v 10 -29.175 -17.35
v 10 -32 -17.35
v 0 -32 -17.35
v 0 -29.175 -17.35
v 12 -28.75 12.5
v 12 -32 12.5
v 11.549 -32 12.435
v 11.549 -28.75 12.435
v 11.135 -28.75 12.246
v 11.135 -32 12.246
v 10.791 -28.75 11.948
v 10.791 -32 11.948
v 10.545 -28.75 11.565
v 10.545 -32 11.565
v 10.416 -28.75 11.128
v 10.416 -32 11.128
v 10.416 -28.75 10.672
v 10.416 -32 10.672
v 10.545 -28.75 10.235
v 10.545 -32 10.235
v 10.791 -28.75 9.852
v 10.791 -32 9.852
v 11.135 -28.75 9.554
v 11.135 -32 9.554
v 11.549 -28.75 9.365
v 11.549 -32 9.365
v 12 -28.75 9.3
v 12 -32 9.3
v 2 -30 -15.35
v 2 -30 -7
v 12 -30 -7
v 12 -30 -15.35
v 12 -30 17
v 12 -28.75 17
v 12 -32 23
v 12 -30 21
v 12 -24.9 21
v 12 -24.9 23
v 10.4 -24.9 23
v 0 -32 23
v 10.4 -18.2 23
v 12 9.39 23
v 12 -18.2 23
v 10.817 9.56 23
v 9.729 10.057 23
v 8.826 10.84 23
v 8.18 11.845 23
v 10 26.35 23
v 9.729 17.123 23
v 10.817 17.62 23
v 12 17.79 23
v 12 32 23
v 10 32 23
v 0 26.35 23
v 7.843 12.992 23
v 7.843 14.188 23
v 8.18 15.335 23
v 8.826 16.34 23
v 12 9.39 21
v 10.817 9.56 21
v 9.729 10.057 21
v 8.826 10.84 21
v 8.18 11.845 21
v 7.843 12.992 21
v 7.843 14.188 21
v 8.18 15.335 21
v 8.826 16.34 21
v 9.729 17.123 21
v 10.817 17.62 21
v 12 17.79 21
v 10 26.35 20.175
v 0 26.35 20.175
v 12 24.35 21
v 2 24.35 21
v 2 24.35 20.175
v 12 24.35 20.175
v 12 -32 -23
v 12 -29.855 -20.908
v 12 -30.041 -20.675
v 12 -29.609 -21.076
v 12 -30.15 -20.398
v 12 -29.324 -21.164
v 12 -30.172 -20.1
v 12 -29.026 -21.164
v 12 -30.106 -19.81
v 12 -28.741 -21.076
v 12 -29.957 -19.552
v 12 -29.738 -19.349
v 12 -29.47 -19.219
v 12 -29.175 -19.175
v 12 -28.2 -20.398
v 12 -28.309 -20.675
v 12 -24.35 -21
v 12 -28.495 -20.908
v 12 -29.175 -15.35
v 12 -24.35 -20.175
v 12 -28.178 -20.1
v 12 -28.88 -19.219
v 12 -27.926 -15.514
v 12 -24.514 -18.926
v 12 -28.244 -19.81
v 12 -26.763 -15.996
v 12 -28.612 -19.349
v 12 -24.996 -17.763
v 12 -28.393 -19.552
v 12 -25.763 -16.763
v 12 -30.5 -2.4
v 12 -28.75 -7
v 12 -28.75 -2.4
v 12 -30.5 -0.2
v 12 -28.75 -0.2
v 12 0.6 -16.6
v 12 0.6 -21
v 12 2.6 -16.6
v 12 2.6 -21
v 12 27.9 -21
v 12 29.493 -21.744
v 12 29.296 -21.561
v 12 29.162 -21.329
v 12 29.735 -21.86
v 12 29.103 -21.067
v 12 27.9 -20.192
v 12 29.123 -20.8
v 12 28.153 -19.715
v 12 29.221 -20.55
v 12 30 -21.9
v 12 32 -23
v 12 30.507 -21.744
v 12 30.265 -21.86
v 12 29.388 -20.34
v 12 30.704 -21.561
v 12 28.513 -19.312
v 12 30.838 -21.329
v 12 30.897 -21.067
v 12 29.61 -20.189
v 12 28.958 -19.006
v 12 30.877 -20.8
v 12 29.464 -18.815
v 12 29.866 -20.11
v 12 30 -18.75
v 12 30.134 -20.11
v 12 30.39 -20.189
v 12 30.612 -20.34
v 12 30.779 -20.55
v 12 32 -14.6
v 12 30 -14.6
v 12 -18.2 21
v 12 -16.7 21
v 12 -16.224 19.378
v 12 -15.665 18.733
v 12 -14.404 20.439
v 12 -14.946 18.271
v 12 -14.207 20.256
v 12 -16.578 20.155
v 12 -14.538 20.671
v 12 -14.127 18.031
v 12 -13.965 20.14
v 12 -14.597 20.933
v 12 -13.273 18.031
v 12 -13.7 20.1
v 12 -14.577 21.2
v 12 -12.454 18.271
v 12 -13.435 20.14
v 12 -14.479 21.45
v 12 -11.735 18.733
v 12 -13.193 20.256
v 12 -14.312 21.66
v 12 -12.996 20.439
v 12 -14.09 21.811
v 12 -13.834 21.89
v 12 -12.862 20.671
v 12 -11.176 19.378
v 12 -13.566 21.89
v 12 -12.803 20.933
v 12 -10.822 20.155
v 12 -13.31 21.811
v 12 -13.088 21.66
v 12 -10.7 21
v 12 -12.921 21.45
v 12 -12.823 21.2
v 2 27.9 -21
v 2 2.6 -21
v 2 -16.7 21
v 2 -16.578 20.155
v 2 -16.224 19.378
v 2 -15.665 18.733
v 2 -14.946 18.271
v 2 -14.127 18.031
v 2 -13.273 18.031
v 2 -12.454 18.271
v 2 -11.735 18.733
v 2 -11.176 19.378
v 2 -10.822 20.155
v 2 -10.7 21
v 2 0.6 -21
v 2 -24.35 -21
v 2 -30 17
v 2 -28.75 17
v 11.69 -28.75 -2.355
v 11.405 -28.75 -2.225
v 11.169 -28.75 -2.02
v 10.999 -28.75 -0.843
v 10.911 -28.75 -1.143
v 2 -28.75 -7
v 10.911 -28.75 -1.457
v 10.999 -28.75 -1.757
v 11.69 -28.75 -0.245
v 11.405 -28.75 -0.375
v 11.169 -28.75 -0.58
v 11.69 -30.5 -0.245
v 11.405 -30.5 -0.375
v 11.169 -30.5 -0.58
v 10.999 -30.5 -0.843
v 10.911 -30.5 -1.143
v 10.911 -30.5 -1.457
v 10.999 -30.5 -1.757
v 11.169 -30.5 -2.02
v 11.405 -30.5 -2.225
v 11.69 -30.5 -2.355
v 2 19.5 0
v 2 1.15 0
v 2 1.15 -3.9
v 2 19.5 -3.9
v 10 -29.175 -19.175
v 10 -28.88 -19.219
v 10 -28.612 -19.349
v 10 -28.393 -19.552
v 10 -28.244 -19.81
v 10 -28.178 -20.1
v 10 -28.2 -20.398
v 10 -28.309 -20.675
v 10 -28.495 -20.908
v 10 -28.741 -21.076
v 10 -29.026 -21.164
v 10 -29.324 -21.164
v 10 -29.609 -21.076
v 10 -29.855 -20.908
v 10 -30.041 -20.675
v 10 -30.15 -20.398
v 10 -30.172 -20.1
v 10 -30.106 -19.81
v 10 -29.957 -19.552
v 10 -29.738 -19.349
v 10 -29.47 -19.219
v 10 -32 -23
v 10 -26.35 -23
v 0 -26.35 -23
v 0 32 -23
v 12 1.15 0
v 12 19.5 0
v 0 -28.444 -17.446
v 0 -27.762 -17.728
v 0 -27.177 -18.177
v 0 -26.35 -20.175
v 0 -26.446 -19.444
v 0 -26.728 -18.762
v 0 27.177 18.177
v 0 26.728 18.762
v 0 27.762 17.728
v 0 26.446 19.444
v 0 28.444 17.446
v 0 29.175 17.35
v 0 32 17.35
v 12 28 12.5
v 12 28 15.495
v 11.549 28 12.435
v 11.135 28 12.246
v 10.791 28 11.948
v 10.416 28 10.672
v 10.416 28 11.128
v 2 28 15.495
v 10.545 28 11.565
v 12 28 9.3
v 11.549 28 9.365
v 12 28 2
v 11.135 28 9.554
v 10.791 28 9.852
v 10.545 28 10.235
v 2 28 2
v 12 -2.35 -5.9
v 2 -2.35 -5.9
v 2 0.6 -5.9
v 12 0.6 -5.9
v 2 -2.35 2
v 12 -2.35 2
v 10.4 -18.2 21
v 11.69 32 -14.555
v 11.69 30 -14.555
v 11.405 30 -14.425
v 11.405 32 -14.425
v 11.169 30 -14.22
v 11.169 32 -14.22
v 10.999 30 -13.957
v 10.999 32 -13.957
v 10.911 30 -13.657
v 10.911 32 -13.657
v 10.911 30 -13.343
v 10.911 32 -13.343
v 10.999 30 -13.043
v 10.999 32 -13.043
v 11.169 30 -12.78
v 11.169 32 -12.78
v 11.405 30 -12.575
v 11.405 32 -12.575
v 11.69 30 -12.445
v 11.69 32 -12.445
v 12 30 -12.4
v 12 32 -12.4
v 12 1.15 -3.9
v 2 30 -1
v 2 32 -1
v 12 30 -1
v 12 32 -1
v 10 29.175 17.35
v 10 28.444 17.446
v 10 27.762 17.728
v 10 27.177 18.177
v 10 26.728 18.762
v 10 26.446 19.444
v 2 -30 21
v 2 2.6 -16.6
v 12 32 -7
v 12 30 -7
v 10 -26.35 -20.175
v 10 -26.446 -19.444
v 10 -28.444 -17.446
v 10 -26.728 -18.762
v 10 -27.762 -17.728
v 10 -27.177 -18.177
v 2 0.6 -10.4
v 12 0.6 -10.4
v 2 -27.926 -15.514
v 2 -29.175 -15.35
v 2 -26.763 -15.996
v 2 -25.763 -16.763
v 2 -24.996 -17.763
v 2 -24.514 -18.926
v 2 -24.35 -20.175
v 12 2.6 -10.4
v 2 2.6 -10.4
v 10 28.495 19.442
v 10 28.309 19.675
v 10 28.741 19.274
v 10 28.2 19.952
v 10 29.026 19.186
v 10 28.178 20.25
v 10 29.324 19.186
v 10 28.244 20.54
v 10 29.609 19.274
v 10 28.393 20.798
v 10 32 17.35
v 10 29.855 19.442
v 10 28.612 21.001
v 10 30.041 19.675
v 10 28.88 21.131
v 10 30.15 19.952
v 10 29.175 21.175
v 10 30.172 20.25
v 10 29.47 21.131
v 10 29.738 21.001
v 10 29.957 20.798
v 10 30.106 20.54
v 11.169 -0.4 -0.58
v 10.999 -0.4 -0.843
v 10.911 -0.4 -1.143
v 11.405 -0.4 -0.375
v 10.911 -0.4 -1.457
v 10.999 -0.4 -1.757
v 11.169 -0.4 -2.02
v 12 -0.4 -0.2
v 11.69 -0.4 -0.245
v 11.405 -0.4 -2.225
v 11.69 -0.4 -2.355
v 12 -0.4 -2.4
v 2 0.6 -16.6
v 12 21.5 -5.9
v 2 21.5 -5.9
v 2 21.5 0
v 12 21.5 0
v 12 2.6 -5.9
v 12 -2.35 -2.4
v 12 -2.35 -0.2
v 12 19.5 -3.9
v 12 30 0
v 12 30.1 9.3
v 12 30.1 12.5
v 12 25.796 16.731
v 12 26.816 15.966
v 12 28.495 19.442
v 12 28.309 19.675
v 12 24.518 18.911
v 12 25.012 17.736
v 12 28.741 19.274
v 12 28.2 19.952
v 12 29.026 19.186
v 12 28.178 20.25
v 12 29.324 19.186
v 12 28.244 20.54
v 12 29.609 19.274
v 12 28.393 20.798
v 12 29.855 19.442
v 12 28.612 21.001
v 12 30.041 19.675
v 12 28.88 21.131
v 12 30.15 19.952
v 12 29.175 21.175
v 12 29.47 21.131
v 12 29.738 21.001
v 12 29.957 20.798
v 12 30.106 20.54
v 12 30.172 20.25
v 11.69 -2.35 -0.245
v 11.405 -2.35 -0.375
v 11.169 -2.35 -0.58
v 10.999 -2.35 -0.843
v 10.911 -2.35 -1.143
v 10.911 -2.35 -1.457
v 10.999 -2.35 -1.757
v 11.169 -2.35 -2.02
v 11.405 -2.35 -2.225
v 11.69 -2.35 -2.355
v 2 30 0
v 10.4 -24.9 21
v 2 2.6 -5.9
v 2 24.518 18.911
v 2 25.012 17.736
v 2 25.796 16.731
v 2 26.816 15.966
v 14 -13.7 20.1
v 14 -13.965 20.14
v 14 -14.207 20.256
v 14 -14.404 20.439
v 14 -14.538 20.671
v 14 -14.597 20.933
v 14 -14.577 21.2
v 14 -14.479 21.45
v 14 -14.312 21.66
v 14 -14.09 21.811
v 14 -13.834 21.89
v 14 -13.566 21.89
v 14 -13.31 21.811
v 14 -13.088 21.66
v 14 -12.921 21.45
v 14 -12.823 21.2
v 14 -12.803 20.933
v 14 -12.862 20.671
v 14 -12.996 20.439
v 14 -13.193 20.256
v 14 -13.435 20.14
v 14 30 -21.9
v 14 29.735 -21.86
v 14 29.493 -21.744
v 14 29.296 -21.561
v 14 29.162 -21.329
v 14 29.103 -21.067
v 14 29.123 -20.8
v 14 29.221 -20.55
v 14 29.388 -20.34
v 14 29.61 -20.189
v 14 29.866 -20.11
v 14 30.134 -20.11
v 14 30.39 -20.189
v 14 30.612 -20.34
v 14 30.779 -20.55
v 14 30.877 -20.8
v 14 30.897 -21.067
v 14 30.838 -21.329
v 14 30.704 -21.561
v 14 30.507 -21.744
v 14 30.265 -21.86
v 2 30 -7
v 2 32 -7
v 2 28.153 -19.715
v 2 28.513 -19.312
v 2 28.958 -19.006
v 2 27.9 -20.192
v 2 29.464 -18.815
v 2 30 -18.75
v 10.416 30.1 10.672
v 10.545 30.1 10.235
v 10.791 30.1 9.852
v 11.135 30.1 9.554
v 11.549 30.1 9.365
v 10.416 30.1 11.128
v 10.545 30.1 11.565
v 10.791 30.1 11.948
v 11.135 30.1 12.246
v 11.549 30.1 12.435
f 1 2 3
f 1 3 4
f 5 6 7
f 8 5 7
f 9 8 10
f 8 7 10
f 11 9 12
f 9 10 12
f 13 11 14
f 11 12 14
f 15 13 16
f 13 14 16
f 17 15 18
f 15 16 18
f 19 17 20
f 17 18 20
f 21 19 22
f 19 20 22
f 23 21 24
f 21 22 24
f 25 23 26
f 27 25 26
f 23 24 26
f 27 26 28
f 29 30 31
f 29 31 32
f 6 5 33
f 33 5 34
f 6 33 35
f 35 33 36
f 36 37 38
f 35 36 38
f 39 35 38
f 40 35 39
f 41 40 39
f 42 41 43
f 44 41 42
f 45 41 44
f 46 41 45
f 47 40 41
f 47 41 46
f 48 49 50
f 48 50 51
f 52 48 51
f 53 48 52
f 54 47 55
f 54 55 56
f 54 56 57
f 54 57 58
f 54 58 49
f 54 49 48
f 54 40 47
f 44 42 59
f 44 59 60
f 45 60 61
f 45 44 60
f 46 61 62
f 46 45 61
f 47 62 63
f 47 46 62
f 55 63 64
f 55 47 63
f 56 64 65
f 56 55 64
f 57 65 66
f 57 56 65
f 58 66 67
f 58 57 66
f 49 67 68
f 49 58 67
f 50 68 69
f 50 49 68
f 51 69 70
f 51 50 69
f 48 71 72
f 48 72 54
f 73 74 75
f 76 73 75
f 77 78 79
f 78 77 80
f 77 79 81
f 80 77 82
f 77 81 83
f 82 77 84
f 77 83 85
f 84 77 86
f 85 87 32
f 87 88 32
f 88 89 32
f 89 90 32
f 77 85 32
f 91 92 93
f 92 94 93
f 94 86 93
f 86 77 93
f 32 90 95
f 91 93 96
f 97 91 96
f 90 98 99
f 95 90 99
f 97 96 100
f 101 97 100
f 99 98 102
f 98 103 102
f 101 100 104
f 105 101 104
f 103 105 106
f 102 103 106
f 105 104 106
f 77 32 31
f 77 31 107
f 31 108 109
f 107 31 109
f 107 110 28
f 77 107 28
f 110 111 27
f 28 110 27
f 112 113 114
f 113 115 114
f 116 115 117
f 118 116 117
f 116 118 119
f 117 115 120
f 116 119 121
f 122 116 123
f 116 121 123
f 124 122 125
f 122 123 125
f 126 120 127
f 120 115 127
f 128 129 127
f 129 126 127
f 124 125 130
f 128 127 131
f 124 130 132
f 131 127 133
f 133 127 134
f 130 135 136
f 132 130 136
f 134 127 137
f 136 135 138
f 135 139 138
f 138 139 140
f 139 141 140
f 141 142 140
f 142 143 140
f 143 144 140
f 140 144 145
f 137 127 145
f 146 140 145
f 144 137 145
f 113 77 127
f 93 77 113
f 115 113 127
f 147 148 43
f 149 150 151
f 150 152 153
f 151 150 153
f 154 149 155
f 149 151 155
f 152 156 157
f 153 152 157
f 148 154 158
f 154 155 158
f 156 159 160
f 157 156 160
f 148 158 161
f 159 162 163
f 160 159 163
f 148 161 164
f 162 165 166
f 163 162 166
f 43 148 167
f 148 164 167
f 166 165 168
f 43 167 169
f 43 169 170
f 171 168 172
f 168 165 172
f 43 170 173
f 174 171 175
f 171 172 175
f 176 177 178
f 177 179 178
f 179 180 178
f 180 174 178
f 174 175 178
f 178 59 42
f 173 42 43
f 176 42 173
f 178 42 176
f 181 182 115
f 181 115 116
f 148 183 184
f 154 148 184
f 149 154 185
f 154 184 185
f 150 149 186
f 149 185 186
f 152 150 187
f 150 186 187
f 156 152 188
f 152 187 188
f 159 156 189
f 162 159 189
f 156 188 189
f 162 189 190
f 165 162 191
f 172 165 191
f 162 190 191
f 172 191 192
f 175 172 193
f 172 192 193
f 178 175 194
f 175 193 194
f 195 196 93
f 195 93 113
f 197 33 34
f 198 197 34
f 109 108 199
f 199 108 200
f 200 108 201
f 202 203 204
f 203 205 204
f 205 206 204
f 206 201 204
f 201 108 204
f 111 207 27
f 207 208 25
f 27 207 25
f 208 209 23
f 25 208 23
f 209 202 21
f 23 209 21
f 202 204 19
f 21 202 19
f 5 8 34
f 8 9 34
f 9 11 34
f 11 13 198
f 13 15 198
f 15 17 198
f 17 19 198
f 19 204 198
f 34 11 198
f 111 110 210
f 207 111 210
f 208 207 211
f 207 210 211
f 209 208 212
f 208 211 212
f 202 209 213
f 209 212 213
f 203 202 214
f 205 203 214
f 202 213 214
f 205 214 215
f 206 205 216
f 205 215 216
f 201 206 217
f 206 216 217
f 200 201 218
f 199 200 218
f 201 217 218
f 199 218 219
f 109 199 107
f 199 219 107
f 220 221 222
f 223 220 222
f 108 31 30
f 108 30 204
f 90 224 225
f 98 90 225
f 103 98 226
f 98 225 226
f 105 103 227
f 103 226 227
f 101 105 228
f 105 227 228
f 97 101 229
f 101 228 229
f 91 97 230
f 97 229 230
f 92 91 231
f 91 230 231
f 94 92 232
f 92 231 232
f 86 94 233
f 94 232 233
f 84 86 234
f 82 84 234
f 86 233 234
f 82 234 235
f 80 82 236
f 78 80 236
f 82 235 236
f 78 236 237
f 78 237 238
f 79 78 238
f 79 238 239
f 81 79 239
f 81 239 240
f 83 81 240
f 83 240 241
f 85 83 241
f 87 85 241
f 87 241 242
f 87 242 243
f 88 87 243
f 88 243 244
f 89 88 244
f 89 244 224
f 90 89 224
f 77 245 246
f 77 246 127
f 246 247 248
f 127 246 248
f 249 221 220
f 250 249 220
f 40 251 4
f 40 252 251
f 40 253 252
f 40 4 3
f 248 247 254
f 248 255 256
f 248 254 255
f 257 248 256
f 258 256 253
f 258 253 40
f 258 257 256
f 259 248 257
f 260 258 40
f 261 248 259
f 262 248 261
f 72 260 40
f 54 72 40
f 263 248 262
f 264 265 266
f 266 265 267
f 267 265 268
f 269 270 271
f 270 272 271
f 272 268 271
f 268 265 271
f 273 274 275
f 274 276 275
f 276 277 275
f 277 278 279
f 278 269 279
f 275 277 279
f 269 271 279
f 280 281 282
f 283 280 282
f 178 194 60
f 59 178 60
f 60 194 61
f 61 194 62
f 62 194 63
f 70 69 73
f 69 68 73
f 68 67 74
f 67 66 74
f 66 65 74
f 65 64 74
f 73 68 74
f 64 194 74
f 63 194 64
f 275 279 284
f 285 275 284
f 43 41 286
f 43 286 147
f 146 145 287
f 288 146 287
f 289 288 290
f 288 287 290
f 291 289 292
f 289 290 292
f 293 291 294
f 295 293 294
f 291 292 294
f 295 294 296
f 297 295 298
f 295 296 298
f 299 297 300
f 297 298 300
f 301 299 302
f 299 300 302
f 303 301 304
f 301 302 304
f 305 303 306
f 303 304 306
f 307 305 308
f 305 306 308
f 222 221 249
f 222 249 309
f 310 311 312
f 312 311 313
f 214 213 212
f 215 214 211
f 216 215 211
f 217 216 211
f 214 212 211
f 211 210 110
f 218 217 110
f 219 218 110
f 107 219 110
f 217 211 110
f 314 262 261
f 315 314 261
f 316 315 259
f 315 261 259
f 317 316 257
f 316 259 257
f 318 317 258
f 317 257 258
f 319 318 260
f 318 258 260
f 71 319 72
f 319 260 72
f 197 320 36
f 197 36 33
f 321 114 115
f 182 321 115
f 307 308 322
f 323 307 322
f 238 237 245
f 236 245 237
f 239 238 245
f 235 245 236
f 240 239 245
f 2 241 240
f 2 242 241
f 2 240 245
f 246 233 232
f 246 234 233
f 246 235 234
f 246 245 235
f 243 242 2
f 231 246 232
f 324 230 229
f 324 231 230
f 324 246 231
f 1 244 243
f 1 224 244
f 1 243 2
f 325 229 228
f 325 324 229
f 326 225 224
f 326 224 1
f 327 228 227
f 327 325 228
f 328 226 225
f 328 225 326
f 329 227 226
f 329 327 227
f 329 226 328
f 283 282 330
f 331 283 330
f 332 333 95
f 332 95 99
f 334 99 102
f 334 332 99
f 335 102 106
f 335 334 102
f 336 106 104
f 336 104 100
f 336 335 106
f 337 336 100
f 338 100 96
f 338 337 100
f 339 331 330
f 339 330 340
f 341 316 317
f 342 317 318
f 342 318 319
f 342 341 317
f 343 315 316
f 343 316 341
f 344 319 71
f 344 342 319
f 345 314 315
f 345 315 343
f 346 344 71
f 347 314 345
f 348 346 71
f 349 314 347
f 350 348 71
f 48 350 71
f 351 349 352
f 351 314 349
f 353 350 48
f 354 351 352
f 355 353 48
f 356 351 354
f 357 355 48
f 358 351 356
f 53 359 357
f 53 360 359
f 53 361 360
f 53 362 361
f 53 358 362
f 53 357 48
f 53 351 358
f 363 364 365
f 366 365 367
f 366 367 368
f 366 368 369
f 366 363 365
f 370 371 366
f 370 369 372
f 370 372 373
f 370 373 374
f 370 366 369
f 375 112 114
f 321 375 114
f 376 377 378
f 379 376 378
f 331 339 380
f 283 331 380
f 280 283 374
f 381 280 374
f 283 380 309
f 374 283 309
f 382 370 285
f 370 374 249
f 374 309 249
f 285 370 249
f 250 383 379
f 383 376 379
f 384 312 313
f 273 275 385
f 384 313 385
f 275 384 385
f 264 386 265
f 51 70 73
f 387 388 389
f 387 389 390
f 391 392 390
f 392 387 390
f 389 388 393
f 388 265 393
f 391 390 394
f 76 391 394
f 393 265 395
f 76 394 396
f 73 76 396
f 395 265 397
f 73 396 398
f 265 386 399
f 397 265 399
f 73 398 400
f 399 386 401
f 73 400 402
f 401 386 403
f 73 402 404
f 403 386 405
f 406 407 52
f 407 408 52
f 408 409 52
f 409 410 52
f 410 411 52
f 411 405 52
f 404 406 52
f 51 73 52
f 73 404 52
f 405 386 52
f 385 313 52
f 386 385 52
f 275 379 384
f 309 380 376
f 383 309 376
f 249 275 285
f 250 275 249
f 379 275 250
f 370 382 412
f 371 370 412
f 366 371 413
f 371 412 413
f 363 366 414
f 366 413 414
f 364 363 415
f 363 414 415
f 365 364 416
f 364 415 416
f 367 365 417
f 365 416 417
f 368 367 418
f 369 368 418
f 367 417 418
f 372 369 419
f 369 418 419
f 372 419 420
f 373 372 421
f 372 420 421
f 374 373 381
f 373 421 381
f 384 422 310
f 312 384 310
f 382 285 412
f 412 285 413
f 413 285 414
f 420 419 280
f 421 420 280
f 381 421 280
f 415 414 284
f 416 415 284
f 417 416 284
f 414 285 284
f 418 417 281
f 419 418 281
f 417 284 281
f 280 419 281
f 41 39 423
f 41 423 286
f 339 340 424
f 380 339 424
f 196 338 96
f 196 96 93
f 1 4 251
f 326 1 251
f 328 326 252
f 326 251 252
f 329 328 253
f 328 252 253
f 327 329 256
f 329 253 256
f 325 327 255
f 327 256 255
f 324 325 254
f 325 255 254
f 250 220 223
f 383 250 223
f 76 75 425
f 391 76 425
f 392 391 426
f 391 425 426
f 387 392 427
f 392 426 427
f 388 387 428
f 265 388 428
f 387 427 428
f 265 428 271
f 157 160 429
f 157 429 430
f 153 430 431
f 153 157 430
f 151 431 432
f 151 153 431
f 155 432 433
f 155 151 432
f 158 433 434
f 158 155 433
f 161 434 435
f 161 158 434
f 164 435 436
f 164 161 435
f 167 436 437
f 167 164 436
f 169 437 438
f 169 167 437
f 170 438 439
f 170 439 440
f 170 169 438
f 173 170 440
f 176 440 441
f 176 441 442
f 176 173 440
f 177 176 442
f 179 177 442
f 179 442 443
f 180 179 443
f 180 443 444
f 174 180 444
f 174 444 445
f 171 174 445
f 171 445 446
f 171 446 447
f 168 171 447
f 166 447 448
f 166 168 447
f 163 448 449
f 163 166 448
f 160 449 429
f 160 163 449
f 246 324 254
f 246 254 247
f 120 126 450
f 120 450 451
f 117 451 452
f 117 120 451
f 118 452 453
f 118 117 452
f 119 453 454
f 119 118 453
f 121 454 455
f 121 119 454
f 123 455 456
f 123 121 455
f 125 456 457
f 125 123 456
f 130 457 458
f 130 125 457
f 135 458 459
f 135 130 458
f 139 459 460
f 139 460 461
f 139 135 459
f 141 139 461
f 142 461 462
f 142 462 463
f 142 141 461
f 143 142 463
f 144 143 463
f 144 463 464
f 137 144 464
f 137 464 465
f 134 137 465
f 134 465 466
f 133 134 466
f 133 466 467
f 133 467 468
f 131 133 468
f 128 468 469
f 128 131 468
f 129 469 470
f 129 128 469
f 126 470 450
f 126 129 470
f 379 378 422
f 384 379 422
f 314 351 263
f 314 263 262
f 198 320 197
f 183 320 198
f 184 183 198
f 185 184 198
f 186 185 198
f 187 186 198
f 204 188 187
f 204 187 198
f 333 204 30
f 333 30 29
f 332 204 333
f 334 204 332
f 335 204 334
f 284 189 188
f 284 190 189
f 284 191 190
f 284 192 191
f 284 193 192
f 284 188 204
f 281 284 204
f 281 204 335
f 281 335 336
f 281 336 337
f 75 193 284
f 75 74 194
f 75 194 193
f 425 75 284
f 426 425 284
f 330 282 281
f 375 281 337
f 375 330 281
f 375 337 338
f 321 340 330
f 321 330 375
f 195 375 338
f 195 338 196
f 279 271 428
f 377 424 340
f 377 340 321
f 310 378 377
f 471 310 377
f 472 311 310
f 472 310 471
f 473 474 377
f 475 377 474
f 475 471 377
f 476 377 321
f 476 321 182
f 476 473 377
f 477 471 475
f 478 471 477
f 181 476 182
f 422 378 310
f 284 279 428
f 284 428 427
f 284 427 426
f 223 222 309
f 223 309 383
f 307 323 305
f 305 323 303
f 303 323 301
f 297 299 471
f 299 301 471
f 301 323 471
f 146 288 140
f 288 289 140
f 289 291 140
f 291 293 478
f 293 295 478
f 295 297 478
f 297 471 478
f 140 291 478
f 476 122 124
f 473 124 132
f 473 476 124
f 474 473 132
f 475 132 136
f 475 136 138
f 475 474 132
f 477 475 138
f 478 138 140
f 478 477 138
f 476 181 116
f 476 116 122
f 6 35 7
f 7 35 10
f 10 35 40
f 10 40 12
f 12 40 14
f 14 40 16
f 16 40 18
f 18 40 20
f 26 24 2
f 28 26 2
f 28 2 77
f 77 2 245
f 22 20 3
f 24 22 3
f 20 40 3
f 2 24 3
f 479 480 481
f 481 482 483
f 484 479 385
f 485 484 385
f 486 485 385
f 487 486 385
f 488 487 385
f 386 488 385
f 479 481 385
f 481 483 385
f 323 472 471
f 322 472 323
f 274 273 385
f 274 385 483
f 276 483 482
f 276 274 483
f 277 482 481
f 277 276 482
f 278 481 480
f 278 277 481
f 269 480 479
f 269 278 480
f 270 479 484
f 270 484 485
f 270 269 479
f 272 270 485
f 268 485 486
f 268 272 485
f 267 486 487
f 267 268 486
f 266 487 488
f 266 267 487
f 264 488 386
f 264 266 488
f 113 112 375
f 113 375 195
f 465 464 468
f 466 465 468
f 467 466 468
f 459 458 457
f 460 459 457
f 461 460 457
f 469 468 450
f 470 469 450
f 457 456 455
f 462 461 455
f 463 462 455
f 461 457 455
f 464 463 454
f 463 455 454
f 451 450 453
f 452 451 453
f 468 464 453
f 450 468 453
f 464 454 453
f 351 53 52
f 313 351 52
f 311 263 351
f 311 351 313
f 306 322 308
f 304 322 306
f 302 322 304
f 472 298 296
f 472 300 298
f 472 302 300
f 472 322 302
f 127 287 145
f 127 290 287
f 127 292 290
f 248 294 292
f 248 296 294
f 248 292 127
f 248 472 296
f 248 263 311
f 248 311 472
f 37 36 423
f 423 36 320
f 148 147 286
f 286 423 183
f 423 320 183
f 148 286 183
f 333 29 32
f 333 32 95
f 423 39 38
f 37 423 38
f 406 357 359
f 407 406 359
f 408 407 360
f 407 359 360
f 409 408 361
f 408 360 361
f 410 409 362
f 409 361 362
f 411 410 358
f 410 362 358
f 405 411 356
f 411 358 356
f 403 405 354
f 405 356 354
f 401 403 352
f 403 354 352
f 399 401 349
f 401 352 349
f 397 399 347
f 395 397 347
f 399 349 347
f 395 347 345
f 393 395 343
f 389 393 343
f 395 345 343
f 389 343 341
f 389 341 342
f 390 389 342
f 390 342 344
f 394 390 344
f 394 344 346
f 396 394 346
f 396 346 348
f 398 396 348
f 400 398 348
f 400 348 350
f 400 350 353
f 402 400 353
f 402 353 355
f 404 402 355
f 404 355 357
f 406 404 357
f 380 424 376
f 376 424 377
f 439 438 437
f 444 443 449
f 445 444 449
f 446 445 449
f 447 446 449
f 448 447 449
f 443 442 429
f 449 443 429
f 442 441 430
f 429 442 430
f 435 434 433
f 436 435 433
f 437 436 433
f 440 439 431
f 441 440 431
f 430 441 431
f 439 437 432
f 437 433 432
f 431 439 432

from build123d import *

# Parameters (mm, degrees)
SKETCH_1_W           = 46
SKETCH_1_H           = 64
EXTRUDE_1_DEPTH      = 12
SHELL_1_T            = -2
SKETCH_3_W           = 4.4
SKETCH_3_H           = 2
SKETCH_3_W_2         = 3.9
SKETCH_3_H_2         = 18.35
EXTRUDE_6_DEPTH      = 10
SKETCH_4_R           = 1
CUT_EXTRUDE_1_DEPTH  = 10
CUT_EXTRUDE_3_REACH  = 43.195
SKETCH_7_R           = 1
EXTRUDE_START        = -12
SKETCH_8_R           = 0.9
EXTRUDE_7_DEPTH      = 2
SKETCH_13_W          = 24
SKETCH_13_H          = 1.25
EXTRUDE_8_DEPTH      = 12
CUT_EXTRUDE_4_REACH  = 71.433
CUT_EXTRUDE_5_REACH  = 71.433
CUT_EXTRUDE_START    = -4
CUT_EXTRUDE_6_DEPTH  = 2.1
CUT_EXTRUDE_START_2  = -1.5
CUT_EXTRUDE_7_DEPTH  = 30.1
CUT_EXTRUDE_8_REACH  = 59.758
CUT_EXTRUDE_9_REACH  = 71.433
SKETCH_15_W          = 10
SKETCH_15_H          = 6
CUT_EXTRUDE_10_REACH = 59.758
SKETCH_16_W          = 1.6
SKETCH_16_H          = 6.7


with BuildPart() as part:
    # 草图1 → 凸台-拉伸1 (new body)
    with BuildSketch(Plane(origin=(0, 0, 0), x_dir=(0, 0, -1), z_dir=(1, 0, 0))):
        Rectangle(SKETCH_1_W, SKETCH_1_H)
    extrude(amount=EXTRUDE_1_DEPTH)

    # 抽壳1
    shell_1_openings = [part.faces().sort_by_distance(p)[0] for p in [
        (12, 0, 0),
    ]]
    offset(amount=SHELL_1_T, openings=shell_1_openings, kind=Kind.INTERSECTION)

    # 草图3 → 凸台-拉伸6 (add)
    # profile 1 of 5: a face of its own
    with BuildSketch(Plane(origin=(2, 0, 0), x_dir=(0, 0, -1), z_dir=(1, 0, 0))):
        with BuildLine():
            Line((20.175, -24.35), (21, -24.35))
            Line((21, -24.35), (21, -30))
            Line((21, -30), (15.35, -30))
            Line((15.35, -30), (15.35, -29.175))
            ThreePointArc((15.35, -29.175), (16.763209781, -25.763209781), (20.175, -24.35))
        make_face()
    # profile 2 of 5: a face of its own
    with BuildSketch(Plane(origin=(2, 0, 0), x_dir=(0, 0, -1), z_dir=(1, 0, 0))):
        with Locations((18.8, 1.6)):
            Rectangle(SKETCH_3_W, SKETCH_3_H)
    # profile 3 of 5: a face of its own
    with BuildSketch(Plane(origin=(2, 0, 0), x_dir=(0, 0, -1), z_dir=(1, 0, 0))):
        with BuildLine():
            Line((-21, 30), (-21, 24.35))
            Line((-21, 24.35), (-20.175, 24.35))
            ThreePointArc((-20.175, 24.35), (-17.207572663, 25.370397524), (-15.495256417, 28))
            Line((-15.495256417, 28), (-2, 28))
            Line((-2, 28), (-2, -2.35))
            Line((-2, -2.35), (5.9, -2.35))
            Line((5.9, -2.35), (5.9, 0.6))
            Line((5.9, 0.6), (10.4, 0.6))
            Line((10.4, 0.6), (10.4, 2.6))
            Line((10.4, 2.6), (5.9, 2.6))
            Line((5.9, 2.6), (5.9, 21.5))
            Line((5.9, 21.5), (0, 21.5))
            Line((0, 21.5), (0, 30))
            Line((0, 30), (-21, 30))
        make_face()
        with Locations((1.95, 10.325)):
            Rectangle(SKETCH_3_W_2, SKETCH_3_H_2, mode=Mode.SUBTRACT)
    # profile 4 of 5: a face of its own
    with BuildSketch(Plane(origin=(2, 0, 0), x_dir=(0, 0, -1), z_dir=(1, 0, 0))):
        with BuildLine():
            Line((-21, -10.7), (-21, -16.7))
            ThreePointArc((-21, -16.7), (-18, -13.7), (-21, -10.7))
        make_face()
    # profile 5 of 5: a face of its own
    with BuildSketch(Plane(origin=(2, 0, 0), x_dir=(0, 0, -1), z_dir=(1, 0, 0))):
        with BuildLine():
            Line((18.75, 30), (21, 30))
            Line((21, 30), (21, 27.9))
            Line((21, 27.9), (20.192225279, 27.9))
            ThreePointArc((20.192225279, 27.9), (19.145277228, 28.72622473), (18.75, 30))
        make_face()
    extrude(amount=EXTRUDE_6_DEPTH)

    # 草图4 → 切除-拉伸1 (cut)
    # profile 1 of 2: a face of its own
    with BuildSketch(Plane.ZY):
        with BuildLine():
            Line((-20.175, -26.35), (-23, -26.35))
            Line((-23, -26.35), (-23, -32))
            Line((-23, -32), (-17.382192318, -32))
            Line((-17.382192318, -32), (-17.35, -32))
            Line((-17.35, -32), (-17.35, -29.175))
            ThreePointArc((-17.35, -29.175), (-18.177423343, -27.177423343), (-20.175, -26.35))
        make_face()
        with Locations((-20.175, -29.175)):
            Circle(SKETCH_4_R, mode=Mode.SUBTRACT)
    # profile 2 of 2: a face of its own
    with BuildSketch(Plane.ZY):
        with BuildLine():
            Line((20.175, 26.35), (23, 26.35))
            Line((23, 26.35), (23, 32))
            Line((23, 32), (17.35, 32))
            Line((17.35, 32), (17.35, 29.175))
            ThreePointArc((17.35, 29.175), (18.177423343, 27.177423343), (20.175, 26.35))
        make_face()
        with Locations((20.175, 29.175)):
            Circle(SKETCH_4_R, mode=Mode.SUBTRACT)
    extrude(amount=-CUT_EXTRUDE_1_DEPTH, mode=Mode.SUBTRACT)

    # 草图7 → 切除-拉伸3 (cut, up to next)
    with BuildSketch(Plane.ZY, mode=Mode.PRIVATE) as cut_extrude_3_sk1:
        with Locations((-20.175, -29.175)):
            Circle(SKETCH_7_R)
    cut_extrude_3_tool1 = extrude(cut_extrude_3_sk1.sketch, amount=-CUT_EXTRUDE_3_REACH, mode=Mode.PRIVATE) & part.part
    # 草图7 → 切除-拉伸3 (cut, up to next)
    with BuildSketch(Plane.ZY, mode=Mode.PRIVATE) as cut_extrude_3_sk2:
        with Locations((20.175, 29.175)):
            Circle(SKETCH_7_R)
    cut_extrude_3_tool2 = extrude(cut_extrude_3_sk2.sketch, amount=-CUT_EXTRUDE_3_REACH, mode=Mode.PRIVATE) & part.part
    add(cut_extrude_3_tool1.solids().sort_by_distance((0, -29.175, -20.175))[0], mode=Mode.SUBTRACT)
    add(cut_extrude_3_tool2.solids().sort_by_distance((0, 29.175, 20.175))[0], mode=Mode.SUBTRACT)

    # 草图8 → 凸台-拉伸7 (add)
    with BuildSketch(Plane.ZY.offset(EXTRUDE_START)):
        with Locations(Location((-21, 30, 0), (0, 0, 180))):
            Circle(SKETCH_8_R)
        with Locations(Location((21, -13.7, 0), (0, 0, 180))):
            Circle(SKETCH_8_R)
    extrude(amount=-EXTRUDE_7_DEPTH)

    # 草图13 → 凸台-拉伸8 (add)
    with BuildSketch(Plane.ZY):
        with Locations((5, -29.375)):
            Rectangle(SKETCH_13_W, SKETCH_13_H)
    extrude(amount=-EXTRUDE_8_DEPTH)

    # 草图9 → 切除-拉伸4 (cut, up to next)
    with BuildSketch(Plane.XZ.offset(32), mode=Mode.PRIVATE) as cut_extrude_4_sk1:
        with BuildLine():
            Line((12, 9.3), (12, 12.5))
            ThreePointArc((12, 12.5), (10.4, 10.9), (12, 9.3))
        make_face()
    cut_extrude_4_tool1 = extrude(cut_extrude_4_sk1.sketch, amount=-CUT_EXTRUDE_4_REACH, mode=Mode.PRIVATE) & part.part
    add(cut_extrude_4_tool1.solids().sort_by_distance((11.320939, -32, 10.9))[0], mode=Mode.SUBTRACT)

    # 草图11 → 切除-拉伸5 (cut, up to next)
    with BuildSketch(Plane(origin=(0, 32, 0), x_dir=(1, 0, 0), z_dir=(0, 1, 0)), mode=Mode.PRIVATE) as cut_extrude_5_sk1:
        with BuildLine():
            Line((12, 12.4), (12, 14.6))
            ThreePointArc((12, 14.6), (10.9, 13.5), (12, 12.4))
        make_face()
    cut_extrude_5_tool1 = extrude(cut_extrude_5_sk1.sketch, amount=-CUT_EXTRUDE_5_REACH, mode=Mode.PRIVATE) & part.part
    add(cut_extrude_5_tool1.solids().sort_by_distance((11.533146, 32, -13.5))[0], mode=Mode.SUBTRACT)

    # 草图12 → 切除-拉伸6 (cut)
    with BuildSketch(Plane(origin=(0, 32, 0), x_dir=(1, 0, 0), z_dir=(0, 1, 0)).offset(CUT_EXTRUDE_START)):
        with BuildLine():
            Line((12, -12.5), (12, -9.3))
            ThreePointArc((12, -9.3), (10.4, -10.9), (12, -12.5))
        make_face()
    extrude(amount=CUT_EXTRUDE_6_DEPTH, mode=Mode.SUBTRACT)

    # 草图10 → 切除-拉伸7 (cut)
    with BuildSketch(Plane.XZ.offset(32).offset(CUT_EXTRUDE_START_2)):
        with BuildLine():
            Line((12, -2.4), (12, -0.2))
            ThreePointArc((12, -0.2), (10.9, -1.3), (12, -2.4))
        make_face()
    extrude(amount=-CUT_EXTRUDE_7_DEPTH, mode=Mode.SUBTRACT)

    # 草图14 → 切除-拉伸8 (cut, up to next)
    with BuildSketch(Plane.XY.offset(23), mode=Mode.PRIVATE) as cut_extrude_8_sk1:
        with BuildLine():
            Line((12, 17.79), (12, 9.39))
            ThreePointArc((12, 9.39), (7.8, 13.59), (12, 17.79))
        make_face()
    cut_extrude_8_tool1 = extrude(cut_extrude_8_sk1.sketch, amount=-CUT_EXTRUDE_8_REACH, mode=Mode.PRIVATE) & part.part
    add(cut_extrude_8_tool1.solids().sort_by_distance((10.217465, 13.59, 23))[0], mode=Mode.SUBTRACT)

    # 草图15 → 电机线切除-拉伸9 (cut, up to next)
    with BuildSketch(Plane(origin=(0, 32, 0), x_dir=(1, 0, 0), z_dir=(0, 1, 0)), mode=Mode.PRIVATE) as cut_extrude_9_sk1:
        with Locations((7, 4)):
            Rectangle(SKETCH_15_W, SKETCH_15_H)
    cut_extrude_9_tool1 = extrude(cut_extrude_9_sk1.sketch, amount=-CUT_EXTRUDE_9_REACH, mode=Mode.PRIVATE) & part.part
    add(cut_extrude_9_tool1.solids().sort_by_distance((7, 32, -4))[0], mode=Mode.SUBTRACT)

    # 草图16 → 拨杆切除-拉伸10 (cut, up to next)
    with BuildSketch(Plane.XY.offset(23), mode=Mode.PRIVATE) as cut_extrude_10_sk1:
        with Locations((11.2, -21.55)):
            Rectangle(SKETCH_16_W, SKETCH_16_H)
    cut_extrude_10_tool1 = extrude(cut_extrude_10_sk1.sketch, amount=-CUT_EXTRUDE_10_REACH, mode=Mode.PRIVATE) & part.part
    add(cut_extrude_10_tool1.solids().sort_by_distance((11.2, -21.55, 23))[0], mode=Mode.SUBTRACT)


solid = part.part
